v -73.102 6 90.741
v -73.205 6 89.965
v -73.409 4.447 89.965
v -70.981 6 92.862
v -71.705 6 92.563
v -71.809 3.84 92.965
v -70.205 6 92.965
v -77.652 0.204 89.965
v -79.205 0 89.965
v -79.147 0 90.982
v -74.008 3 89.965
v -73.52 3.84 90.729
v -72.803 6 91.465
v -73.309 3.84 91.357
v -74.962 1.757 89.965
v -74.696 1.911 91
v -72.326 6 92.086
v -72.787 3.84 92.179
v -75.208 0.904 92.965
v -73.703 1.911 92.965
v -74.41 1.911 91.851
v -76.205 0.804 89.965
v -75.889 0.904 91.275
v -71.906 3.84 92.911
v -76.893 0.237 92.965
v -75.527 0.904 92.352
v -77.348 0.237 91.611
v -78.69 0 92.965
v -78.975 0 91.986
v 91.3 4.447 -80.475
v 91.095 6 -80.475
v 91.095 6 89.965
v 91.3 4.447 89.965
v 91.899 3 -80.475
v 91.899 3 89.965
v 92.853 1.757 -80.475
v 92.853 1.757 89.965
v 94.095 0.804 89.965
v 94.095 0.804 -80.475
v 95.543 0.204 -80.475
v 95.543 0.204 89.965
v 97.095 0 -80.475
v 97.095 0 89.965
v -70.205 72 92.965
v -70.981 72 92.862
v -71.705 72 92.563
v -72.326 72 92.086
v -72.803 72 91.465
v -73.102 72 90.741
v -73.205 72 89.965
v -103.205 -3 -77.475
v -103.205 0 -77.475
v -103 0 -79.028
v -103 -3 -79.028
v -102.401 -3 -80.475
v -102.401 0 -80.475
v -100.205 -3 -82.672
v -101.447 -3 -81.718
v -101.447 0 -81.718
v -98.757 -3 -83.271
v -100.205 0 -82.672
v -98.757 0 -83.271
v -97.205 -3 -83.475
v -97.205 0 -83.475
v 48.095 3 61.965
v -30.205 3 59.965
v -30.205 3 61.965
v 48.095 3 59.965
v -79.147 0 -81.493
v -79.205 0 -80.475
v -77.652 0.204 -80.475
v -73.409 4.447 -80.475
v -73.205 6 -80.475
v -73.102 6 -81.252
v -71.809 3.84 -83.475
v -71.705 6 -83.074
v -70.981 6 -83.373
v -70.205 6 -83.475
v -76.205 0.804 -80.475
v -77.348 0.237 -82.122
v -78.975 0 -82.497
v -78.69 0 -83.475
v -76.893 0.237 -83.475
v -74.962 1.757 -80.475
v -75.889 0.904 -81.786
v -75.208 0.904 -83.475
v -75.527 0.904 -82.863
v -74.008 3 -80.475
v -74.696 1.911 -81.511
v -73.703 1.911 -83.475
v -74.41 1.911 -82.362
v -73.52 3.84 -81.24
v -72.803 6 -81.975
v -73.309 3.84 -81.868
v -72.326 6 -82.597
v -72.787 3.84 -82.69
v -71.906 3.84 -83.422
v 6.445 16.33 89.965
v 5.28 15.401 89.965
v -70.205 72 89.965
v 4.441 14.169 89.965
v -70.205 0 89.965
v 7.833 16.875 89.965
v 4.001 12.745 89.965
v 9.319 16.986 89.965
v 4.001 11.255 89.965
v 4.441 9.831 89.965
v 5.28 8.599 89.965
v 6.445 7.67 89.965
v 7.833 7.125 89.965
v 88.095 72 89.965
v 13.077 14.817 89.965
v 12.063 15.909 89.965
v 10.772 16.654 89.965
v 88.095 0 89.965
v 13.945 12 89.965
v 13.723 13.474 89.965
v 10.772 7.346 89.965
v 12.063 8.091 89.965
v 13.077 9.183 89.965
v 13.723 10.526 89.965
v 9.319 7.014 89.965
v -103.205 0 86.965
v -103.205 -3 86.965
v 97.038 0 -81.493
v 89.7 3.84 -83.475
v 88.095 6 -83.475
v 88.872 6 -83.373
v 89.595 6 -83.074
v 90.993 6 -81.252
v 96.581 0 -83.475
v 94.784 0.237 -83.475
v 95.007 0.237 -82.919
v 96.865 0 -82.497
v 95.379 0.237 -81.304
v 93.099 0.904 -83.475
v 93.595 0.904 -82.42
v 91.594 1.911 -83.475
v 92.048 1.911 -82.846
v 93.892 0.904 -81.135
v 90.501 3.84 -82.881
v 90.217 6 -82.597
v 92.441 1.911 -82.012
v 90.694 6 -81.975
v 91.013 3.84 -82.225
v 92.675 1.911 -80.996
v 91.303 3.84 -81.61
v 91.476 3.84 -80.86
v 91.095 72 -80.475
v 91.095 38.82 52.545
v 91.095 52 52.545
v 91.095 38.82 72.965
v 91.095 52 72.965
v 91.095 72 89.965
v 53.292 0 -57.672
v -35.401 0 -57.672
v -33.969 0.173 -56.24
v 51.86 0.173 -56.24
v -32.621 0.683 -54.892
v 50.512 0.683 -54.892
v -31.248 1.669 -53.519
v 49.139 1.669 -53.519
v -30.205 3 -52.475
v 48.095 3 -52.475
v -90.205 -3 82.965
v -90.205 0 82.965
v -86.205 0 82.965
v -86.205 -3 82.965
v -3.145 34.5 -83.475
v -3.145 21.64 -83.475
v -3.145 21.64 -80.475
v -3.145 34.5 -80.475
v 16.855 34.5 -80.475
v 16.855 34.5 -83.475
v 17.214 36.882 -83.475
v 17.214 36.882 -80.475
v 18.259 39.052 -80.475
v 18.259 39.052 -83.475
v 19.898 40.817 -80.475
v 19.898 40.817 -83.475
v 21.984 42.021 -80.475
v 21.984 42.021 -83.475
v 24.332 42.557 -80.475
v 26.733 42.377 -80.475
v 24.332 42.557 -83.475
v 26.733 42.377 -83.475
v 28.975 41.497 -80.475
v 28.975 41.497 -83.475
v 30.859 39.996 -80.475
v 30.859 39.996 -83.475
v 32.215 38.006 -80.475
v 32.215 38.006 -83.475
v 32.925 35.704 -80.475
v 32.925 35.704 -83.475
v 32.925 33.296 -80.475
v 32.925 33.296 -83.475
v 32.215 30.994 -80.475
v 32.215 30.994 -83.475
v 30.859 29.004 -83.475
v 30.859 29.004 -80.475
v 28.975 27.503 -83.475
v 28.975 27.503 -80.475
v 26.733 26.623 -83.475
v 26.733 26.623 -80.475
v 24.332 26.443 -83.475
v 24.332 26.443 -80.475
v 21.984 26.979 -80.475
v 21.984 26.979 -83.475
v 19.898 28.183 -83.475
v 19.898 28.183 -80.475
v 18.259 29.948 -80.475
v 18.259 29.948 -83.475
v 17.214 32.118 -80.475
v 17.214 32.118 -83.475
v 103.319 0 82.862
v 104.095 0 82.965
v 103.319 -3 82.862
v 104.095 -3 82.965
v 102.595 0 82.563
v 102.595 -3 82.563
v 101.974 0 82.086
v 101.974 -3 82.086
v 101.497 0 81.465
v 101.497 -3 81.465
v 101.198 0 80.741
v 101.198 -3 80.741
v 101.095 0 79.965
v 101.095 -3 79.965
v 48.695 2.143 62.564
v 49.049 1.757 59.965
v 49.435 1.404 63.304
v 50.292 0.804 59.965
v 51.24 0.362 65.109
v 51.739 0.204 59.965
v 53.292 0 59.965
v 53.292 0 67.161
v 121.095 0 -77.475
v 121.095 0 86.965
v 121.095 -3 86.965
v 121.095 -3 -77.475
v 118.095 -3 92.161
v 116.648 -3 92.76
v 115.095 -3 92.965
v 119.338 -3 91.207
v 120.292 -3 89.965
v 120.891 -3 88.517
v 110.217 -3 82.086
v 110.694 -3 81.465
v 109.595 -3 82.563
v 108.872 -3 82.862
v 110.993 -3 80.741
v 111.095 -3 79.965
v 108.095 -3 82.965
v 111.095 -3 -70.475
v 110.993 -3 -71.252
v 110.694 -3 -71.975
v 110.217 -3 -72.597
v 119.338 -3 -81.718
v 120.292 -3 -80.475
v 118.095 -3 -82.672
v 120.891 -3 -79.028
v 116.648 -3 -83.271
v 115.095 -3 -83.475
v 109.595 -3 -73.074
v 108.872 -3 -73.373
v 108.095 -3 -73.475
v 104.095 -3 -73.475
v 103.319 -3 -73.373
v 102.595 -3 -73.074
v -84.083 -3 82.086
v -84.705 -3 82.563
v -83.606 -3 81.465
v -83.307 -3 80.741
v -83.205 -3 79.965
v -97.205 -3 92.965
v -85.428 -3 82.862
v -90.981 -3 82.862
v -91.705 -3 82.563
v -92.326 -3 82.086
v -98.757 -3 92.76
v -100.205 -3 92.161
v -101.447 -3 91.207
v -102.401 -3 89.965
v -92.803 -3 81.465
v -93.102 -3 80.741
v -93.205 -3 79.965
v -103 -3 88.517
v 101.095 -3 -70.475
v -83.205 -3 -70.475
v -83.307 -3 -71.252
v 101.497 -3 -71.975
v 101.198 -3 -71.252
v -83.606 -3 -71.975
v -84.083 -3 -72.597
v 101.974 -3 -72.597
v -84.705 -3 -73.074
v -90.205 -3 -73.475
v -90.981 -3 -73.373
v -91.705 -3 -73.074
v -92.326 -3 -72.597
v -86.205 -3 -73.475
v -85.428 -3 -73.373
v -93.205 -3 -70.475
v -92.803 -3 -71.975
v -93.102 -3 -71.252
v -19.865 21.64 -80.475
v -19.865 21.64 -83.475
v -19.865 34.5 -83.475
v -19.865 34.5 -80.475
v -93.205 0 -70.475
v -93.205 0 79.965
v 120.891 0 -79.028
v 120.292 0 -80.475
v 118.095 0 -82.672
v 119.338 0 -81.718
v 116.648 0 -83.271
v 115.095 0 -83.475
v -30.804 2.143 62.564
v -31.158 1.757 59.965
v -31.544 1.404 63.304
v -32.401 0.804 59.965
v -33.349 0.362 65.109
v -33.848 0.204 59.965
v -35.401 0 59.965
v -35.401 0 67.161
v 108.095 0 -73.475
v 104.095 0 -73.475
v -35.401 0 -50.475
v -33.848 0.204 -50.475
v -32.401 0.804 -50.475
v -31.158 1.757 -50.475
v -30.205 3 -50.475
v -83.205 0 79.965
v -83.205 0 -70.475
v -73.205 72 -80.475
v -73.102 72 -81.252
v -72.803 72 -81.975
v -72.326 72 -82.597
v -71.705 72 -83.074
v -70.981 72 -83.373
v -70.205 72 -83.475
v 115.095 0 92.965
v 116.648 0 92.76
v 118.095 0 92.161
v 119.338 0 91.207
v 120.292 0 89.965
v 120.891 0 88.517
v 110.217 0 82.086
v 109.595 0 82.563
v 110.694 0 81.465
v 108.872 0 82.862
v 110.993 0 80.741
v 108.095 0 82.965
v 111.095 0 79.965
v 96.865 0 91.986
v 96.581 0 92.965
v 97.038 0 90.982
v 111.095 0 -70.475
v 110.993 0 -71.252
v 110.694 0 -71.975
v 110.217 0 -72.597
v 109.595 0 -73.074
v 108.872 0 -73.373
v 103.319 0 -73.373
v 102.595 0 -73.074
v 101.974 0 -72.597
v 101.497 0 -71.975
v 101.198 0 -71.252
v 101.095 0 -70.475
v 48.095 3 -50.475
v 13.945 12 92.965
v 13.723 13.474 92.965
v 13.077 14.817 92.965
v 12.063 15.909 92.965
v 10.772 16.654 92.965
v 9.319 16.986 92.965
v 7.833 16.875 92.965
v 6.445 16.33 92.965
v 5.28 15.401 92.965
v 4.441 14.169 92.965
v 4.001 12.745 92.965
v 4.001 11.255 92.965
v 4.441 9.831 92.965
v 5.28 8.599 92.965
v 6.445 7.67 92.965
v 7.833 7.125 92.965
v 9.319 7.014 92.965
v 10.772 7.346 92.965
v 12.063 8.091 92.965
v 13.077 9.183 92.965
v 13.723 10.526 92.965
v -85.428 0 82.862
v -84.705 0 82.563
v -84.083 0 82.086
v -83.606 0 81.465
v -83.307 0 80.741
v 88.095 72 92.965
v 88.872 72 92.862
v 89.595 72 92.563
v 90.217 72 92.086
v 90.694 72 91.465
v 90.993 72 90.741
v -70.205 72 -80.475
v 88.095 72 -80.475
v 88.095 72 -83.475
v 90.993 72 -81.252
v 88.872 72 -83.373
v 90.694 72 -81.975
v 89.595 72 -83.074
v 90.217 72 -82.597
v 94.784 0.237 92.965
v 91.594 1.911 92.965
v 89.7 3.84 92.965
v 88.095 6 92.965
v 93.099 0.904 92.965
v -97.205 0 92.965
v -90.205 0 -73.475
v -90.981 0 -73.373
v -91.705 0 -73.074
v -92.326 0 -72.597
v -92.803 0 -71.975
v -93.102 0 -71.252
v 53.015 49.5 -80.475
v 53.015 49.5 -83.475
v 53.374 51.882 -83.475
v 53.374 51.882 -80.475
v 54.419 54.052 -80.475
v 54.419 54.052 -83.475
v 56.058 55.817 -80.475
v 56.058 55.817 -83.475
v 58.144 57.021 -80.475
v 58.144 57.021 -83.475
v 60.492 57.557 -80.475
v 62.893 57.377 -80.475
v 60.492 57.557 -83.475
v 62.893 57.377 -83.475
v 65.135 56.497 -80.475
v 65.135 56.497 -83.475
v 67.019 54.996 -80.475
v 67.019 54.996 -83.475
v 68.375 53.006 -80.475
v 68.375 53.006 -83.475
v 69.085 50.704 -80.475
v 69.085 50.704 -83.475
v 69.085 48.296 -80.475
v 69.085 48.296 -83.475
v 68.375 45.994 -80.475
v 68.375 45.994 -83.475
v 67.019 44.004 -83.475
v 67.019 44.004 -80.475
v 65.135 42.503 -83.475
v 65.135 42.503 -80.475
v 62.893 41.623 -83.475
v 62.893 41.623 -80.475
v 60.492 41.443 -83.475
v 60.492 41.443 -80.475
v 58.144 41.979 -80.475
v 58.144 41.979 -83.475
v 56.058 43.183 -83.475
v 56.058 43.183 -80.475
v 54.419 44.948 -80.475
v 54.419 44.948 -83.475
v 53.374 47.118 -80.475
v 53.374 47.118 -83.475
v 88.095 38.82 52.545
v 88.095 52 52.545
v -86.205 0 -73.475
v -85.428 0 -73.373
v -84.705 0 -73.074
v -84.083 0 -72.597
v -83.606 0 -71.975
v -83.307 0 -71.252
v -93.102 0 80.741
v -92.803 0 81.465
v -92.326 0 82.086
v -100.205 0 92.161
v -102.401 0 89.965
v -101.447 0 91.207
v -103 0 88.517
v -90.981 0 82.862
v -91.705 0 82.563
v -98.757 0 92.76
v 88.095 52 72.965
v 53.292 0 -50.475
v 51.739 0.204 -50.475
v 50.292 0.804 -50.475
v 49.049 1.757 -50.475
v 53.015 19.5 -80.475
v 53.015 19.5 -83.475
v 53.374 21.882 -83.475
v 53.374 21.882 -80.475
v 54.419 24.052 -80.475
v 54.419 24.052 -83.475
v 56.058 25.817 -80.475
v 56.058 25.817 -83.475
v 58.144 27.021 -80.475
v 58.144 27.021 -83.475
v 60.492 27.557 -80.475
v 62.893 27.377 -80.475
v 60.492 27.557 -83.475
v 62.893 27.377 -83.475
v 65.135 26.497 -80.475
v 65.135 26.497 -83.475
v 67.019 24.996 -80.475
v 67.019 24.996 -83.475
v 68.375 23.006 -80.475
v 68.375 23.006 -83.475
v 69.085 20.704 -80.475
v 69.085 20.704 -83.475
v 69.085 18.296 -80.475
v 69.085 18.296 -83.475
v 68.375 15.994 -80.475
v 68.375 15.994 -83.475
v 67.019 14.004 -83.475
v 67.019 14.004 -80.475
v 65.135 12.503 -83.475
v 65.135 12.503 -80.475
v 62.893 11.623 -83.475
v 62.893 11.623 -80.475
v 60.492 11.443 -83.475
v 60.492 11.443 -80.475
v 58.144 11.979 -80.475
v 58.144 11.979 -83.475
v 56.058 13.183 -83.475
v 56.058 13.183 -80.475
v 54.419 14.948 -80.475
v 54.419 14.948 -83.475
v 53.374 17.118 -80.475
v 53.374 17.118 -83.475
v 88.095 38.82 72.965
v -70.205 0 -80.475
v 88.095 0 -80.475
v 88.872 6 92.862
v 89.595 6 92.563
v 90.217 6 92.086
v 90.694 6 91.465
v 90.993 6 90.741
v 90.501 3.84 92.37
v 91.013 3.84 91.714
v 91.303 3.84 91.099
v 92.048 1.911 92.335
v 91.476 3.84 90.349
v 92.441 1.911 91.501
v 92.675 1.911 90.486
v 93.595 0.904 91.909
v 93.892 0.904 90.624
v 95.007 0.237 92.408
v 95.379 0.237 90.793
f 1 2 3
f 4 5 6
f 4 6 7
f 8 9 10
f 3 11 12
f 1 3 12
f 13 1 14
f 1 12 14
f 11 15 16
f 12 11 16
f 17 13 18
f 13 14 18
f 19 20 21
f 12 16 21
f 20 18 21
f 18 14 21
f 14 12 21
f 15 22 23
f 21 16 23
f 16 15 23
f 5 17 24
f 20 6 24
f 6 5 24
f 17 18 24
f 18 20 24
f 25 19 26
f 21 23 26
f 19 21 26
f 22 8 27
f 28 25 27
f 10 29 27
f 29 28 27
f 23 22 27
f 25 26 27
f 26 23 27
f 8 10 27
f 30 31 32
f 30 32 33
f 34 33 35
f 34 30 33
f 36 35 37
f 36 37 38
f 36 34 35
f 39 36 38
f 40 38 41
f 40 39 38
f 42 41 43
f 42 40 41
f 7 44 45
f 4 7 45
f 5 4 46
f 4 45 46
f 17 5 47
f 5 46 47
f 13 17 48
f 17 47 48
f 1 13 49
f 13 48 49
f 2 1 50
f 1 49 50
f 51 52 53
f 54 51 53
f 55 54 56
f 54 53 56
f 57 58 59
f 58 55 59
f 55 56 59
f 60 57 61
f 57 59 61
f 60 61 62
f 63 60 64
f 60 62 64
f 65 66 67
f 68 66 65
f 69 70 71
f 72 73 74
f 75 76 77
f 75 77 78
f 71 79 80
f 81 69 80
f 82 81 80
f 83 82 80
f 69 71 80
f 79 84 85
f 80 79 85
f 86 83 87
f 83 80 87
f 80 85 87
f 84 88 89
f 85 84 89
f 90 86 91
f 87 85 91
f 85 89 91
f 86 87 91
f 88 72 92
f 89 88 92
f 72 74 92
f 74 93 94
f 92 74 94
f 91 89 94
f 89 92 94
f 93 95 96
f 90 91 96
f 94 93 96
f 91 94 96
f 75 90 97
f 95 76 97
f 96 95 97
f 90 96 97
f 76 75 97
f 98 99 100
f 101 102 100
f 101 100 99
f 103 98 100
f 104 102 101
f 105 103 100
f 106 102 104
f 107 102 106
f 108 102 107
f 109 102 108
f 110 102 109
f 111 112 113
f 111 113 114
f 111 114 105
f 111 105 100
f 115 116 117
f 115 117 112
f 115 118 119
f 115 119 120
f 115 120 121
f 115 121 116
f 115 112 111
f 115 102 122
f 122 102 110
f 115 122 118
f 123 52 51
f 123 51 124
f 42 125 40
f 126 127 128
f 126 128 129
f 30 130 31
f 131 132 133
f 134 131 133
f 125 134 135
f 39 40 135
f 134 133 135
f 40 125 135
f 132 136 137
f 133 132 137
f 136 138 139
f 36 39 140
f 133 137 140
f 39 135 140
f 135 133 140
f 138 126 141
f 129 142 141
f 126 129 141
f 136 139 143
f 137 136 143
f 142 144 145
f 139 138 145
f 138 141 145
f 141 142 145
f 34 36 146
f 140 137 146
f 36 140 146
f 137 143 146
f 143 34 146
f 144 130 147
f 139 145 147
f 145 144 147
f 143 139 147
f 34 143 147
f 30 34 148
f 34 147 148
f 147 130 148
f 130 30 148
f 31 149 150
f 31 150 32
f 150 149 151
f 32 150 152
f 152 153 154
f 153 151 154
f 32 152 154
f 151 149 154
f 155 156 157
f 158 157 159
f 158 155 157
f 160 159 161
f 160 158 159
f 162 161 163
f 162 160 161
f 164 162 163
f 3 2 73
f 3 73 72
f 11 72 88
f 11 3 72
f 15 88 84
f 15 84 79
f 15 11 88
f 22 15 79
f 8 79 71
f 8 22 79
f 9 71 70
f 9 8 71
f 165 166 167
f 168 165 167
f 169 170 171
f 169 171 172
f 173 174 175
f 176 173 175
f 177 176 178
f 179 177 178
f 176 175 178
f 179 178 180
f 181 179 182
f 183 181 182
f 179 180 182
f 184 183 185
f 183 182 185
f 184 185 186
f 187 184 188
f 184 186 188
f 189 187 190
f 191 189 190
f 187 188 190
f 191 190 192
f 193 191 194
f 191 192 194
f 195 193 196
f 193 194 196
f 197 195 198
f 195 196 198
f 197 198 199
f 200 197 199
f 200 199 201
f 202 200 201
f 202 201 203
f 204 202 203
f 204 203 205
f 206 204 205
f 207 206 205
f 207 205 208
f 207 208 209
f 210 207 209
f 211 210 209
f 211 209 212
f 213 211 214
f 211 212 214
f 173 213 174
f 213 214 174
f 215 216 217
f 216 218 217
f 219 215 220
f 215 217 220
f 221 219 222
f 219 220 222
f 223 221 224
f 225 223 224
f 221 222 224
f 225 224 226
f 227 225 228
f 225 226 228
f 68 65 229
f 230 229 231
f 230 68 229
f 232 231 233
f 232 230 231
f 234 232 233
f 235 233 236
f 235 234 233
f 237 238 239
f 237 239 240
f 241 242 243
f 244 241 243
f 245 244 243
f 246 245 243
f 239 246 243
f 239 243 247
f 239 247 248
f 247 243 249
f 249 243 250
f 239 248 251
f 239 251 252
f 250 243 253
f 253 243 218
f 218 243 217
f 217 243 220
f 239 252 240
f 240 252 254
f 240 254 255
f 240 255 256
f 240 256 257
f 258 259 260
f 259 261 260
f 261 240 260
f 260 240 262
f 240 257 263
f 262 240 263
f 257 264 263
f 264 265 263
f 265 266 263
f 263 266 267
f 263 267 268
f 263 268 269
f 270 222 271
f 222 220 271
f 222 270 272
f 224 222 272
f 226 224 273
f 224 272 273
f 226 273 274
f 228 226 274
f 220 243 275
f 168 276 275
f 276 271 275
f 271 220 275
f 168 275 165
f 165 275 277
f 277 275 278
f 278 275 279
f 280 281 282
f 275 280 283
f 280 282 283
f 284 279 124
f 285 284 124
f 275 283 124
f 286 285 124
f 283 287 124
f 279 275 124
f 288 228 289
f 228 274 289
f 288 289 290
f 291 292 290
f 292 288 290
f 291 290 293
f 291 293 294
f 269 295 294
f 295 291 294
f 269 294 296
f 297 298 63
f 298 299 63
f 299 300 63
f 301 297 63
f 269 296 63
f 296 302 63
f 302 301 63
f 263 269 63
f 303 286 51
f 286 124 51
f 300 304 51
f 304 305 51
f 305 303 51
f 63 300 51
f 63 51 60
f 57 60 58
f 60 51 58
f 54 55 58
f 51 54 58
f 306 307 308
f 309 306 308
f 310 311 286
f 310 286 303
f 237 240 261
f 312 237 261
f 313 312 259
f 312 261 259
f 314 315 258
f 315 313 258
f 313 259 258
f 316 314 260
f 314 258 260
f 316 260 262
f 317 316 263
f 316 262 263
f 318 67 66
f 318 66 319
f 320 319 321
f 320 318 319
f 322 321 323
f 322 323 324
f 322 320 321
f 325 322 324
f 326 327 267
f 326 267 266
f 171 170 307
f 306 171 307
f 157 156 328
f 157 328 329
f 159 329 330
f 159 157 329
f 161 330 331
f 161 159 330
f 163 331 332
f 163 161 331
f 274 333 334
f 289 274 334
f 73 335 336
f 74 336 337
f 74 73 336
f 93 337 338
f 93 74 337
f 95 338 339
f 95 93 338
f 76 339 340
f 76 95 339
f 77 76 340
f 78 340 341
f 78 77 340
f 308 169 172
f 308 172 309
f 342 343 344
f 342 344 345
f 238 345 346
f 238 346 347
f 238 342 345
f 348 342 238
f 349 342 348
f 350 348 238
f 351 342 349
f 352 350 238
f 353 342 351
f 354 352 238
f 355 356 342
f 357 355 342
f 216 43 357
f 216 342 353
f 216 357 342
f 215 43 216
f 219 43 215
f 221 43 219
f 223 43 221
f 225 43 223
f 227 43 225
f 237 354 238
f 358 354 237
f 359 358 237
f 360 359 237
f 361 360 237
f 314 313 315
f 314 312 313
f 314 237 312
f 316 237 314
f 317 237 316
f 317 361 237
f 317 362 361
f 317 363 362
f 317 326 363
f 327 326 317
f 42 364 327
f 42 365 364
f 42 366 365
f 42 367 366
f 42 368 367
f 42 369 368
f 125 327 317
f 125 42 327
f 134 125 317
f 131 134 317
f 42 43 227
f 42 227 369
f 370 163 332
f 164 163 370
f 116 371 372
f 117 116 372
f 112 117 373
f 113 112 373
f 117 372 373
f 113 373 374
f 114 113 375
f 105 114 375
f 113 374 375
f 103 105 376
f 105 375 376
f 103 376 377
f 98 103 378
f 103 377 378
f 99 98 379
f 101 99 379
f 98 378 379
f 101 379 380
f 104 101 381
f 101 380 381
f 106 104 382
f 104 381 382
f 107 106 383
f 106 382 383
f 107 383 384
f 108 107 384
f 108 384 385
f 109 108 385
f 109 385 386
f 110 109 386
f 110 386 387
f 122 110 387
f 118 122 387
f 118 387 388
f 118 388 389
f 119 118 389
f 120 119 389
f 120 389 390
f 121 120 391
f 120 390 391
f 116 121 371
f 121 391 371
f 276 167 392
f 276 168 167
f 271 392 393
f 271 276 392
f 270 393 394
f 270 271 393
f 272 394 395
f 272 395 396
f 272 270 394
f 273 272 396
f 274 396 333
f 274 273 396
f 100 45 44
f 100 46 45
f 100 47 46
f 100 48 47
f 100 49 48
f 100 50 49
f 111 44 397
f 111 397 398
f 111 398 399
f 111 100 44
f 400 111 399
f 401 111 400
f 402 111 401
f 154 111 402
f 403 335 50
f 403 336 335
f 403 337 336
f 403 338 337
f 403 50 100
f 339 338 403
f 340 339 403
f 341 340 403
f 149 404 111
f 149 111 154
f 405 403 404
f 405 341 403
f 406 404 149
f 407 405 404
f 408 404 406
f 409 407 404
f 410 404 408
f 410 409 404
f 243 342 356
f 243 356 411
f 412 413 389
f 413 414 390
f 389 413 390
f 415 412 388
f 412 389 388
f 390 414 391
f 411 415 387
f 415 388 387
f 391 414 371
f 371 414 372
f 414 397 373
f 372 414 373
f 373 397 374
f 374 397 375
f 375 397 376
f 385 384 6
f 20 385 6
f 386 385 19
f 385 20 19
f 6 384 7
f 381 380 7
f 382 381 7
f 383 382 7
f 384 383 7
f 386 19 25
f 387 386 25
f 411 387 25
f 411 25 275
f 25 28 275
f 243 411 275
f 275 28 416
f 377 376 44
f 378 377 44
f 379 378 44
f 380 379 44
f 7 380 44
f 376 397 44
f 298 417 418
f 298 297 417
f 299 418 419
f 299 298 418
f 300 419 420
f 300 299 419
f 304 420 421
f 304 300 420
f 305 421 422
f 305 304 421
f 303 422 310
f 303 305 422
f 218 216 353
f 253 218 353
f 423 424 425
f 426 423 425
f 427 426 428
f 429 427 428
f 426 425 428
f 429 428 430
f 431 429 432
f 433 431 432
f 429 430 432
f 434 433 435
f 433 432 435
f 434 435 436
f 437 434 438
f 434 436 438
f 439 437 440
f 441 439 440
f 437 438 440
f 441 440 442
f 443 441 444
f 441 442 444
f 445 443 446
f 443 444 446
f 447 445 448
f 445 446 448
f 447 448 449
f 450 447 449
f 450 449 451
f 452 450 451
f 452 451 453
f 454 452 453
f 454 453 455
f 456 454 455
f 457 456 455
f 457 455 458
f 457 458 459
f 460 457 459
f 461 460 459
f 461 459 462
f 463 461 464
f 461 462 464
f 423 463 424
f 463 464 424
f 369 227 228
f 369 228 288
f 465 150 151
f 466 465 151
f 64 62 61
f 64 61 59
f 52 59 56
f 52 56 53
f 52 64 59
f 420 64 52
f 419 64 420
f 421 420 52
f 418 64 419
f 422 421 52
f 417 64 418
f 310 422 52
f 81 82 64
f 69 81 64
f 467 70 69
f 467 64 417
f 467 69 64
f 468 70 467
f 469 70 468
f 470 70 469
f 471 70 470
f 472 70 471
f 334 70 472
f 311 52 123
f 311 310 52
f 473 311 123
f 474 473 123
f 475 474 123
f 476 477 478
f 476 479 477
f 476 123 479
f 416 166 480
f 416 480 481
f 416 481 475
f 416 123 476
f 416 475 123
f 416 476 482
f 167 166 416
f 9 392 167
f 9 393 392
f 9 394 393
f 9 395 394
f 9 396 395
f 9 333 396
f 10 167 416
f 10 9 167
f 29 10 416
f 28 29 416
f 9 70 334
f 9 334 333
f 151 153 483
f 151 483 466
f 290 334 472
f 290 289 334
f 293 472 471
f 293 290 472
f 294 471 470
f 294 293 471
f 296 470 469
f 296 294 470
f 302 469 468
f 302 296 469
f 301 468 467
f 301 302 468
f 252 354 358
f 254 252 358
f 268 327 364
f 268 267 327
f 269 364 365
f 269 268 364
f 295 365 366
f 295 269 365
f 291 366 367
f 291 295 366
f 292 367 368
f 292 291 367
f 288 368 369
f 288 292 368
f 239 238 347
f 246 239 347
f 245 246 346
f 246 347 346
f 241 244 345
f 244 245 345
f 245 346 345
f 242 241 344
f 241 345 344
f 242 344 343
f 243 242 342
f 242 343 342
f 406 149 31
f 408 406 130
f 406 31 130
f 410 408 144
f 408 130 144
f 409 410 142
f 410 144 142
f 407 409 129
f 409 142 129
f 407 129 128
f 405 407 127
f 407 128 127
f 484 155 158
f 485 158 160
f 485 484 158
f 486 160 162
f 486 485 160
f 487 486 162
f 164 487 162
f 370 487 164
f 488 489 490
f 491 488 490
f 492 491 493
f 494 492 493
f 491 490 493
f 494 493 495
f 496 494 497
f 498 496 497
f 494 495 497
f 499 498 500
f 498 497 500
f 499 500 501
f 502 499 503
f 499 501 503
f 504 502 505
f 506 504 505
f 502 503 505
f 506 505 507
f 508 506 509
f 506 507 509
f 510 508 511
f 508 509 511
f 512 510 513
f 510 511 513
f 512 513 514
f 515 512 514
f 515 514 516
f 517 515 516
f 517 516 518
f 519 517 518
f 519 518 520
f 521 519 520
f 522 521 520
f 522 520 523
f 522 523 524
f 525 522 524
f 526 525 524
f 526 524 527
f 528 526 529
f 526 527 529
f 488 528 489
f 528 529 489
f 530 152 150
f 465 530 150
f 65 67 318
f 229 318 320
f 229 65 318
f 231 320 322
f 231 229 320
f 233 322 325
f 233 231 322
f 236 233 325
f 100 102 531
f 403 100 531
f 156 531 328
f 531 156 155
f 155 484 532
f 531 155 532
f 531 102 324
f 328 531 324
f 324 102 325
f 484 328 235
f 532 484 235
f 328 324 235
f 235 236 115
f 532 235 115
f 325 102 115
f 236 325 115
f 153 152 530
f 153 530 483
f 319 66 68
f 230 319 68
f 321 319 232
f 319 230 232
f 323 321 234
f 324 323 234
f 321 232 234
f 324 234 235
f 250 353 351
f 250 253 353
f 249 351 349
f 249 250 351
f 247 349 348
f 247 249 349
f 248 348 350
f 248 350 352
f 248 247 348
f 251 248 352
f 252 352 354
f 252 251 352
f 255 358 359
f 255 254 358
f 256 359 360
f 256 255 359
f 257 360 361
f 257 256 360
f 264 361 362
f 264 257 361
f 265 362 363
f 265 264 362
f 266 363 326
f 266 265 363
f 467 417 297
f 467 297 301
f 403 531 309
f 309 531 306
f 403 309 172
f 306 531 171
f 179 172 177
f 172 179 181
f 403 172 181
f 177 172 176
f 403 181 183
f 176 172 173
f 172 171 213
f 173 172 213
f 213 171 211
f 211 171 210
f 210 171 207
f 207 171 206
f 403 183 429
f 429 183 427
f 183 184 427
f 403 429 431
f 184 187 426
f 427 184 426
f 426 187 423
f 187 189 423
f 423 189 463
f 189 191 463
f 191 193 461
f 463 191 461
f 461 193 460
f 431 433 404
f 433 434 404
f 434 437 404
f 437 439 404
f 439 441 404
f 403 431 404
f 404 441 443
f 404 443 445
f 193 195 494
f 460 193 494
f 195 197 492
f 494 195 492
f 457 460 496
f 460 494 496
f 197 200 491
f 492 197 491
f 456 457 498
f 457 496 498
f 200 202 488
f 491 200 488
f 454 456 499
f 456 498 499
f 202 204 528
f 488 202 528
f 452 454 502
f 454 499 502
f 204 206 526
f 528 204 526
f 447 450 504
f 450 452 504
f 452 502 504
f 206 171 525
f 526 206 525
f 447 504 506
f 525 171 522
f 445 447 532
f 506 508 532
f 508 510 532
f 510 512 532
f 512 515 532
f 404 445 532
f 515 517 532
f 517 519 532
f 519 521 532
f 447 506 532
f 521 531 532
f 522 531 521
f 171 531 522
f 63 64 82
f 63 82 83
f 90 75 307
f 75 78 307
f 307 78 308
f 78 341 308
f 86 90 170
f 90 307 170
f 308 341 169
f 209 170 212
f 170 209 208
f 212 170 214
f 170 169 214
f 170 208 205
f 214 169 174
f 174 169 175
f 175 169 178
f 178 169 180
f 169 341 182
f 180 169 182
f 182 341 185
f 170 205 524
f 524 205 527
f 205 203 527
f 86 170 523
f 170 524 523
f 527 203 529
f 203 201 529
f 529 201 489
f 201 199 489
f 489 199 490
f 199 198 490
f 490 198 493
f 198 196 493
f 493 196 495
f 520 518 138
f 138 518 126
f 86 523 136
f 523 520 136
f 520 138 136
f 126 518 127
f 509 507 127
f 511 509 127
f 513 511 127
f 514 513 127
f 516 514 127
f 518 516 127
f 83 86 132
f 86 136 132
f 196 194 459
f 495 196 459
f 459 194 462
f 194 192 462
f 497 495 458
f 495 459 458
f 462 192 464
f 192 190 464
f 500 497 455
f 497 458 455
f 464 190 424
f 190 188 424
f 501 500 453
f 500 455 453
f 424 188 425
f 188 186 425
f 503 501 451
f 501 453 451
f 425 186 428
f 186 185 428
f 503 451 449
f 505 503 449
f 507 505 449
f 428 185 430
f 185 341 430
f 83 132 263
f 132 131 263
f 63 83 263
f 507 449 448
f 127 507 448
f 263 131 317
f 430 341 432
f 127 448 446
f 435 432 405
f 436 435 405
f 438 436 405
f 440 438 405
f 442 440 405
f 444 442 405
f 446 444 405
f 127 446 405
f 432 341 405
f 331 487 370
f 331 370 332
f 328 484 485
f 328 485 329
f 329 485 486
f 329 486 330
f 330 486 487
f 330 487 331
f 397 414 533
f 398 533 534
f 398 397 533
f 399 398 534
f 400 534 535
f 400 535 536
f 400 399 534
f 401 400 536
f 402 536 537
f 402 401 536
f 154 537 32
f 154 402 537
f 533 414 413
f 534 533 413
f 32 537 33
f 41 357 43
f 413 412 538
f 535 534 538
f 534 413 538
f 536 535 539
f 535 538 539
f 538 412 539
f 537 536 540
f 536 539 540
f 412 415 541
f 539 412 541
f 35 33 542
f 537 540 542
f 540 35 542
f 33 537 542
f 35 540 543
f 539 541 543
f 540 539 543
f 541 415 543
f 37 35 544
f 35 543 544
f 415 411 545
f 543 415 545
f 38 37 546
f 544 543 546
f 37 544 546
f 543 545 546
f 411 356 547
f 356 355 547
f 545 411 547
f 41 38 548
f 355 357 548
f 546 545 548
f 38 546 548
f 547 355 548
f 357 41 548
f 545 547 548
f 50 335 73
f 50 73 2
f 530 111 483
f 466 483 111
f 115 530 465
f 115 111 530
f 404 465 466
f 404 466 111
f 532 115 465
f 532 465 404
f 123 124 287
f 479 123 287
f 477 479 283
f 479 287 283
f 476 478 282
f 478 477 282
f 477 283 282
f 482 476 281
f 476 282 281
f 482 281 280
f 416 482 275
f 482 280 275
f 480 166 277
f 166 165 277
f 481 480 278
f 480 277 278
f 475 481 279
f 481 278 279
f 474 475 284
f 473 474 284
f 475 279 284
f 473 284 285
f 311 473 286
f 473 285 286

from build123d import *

# Parameters (mm, degrees)
SKETCH1_W           = 164.3
SKETCH1_H           = 176.44
SKETCH1_W_2         = 158.3
SKETCH1_H_2         = 170.44
BOSS_EXTRUDE1_DEPTH = 72
SKETCH2_W           = 164.3
SKETCH2_H           = 176.44
BOSS_EXTRUDE2_DEPTH = 3
SKETCH3_R           = 8.08
SKETCH3_W           = 16.72
SKETCH3_H           = 12.86
CUT_EXTRUDE1_DEPTH  = 3
SKETCH4_W           = 20.42
SKETCH4_H           = 13.18
CUT_EXTRUDE2_DEPTH  = 3
SKETCH5_R           = 5
CUT_EXTRUDE3_DEPTH  = 3
SKETCH6_W           = 176.44
SKETCH6_H           = 3
BOSS_EXTRUDE3_DEPTH = 30
SKETCH7_W           = 176.44
SKETCH7_H           = 3
BOSS_EXTRUDE4_DEPTH = 30
SKETCH9_W           = 10
SKETCH9_H           = 156.44
CUT_EXTRUDE4_DEPTH  = 169.791343641
SKETCH10_W          = 10
SKETCH10_H          = 156.44
CUT_EXTRUDE5_DEPTH  = 169.791343641
FILLET1_R           = 3
FILLET2_R           = 6
SKETCH11_W          = 78.3
SKETCH11_H          = 2
BOSS_EXTRUDE5_DEPTH = 3
FILLET3_R           = 6


with BuildPart() as part:
    # Sketch1 → Boss-Extrude1 (new body)
    with BuildSketch(Plane(origin=(0, 0, 0), x_dir=(1, 0, 0), z_dir=(0, 1, 0))):
        with Locations((8.94546986, -4.744535538)):
            Rectangle(SKETCH1_W, SKETCH1_H)
        with Locations((8.94546986, -4.744535538)):
            Rectangle(SKETCH1_W_2, SKETCH1_H_2, mode=Mode.SUBTRACT)
    extrude(amount=BOSS_EXTRUDE1_DEPTH)

    # Sketch2 → Boss-Extrude2 (add)
    with BuildSketch(Plane.XZ):
        with Locations((8.94546986, 4.744535538)):
            Rectangle(SKETCH2_W, SKETCH2_H)
    extrude(amount=BOSS_EXTRUDE2_DEPTH)

    # Sketch3 → Cut-Extrude1 (cut)
    with BuildSketch(Plane(origin=(0, 0, -83.475464462), x_dir=(-1, 0, 0), z_dir=(0, 0, -1))):
        with Locations((-61.09546986, 49.5)):
            Circle(SKETCH3_R)
        with Locations((-61.09546986, 19.5)):
            Circle(SKETCH3_R)
        with Locations((-24.93546986, 34.5)):
            Circle(SKETCH3_R)
        with Locations((11.50453014, 28.07)):
            Rectangle(SKETCH3_W, SKETCH3_H)
    extrude(amount=-CUT_EXTRUDE1_DEPTH, mode=Mode.SUBTRACT)

    # Sketch4 → Cut-Extrude2 (cut)
    with BuildSketch(Plane(origin=(91.09546986, 0, 0), x_dir=(0, 0, -1), z_dir=(1, 0, 0))):
        with Locations((-62.754535538, 45.41)):
            Rectangle(SKETCH4_W, SKETCH4_H)
    extrude(amount=-CUT_EXTRUDE2_DEPTH, mode=Mode.SUBTRACT)

    # Sketch5 → Cut-Extrude3 (cut)
    with BuildSketch(Plane.XY.offset(92.964535538)):
        with Locations((8.94546986, 12)):
            Circle(SKETCH5_R)
    extrude(amount=-CUT_EXTRUDE3_DEPTH, mode=Mode.SUBTRACT)

    # Sketch6 → Boss-Extrude3 (add)
    with BuildSketch(Plane.ZY.offset(73.20453014)):
        with Locations((4.744535538, -1.5)):
            Rectangle(SKETCH6_W, SKETCH6_H)
    extrude(amount=BOSS_EXTRUDE3_DEPTH)

    # Sketch7 → Boss-Extrude4 (add)
    with BuildSketch(Plane(origin=(91.09546986, 0, 0), x_dir=(0, 0, -1), z_dir=(1, 0, 0))):
        with Locations((-4.744535538, -1.5)):
            Rectangle(SKETCH7_W, SKETCH7_H)
    extrude(amount=BOSS_EXTRUDE4_DEPTH)

    # Sketch9 → Cut-Extrude4 (cut, through all)
    with BuildSketch(Plane(origin=(0, 0, 0), x_dir=(1, 0, 0), z_dir=(0, 1, 0))):
        with Locations((-88.20453014, -4.744535538)):
            Rectangle(SKETCH9_W, SKETCH9_H)
    extrude(amount=-CUT_EXTRUDE4_DEPTH, mode=Mode.SUBTRACT)

    # Sketch10 → Cut-Extrude5 (cut, through all)
    with BuildSketch(Plane(origin=(0, 0, 0), x_dir=(1, 0, 0), z_dir=(0, 1, 0))):
        with Locations((106.09546986, -4.744535538)):
            Rectangle(SKETCH10_W, SKETCH10_H)
    extrude(amount=-CUT_EXTRUDE5_DEPTH, mode=Mode.SUBTRACT)

    # Fillet1
    fillet1_edges = [part.edges().sort_by_distance(p)[0] for p in [
        (-83.20453014, -1.5, 82.964535538),
        (-93.20453014, -1.5, 82.964535538),
        (-93.20453014, -1.5, -73.475464462),
        (-83.20453014, -1.5, -73.475464462),
        (101.09546986, -1.5, -73.475464462),
        (111.09546986, -1.5, -73.475464462),
        (111.09546986, -1.5, 82.964535538),
        (101.09546986, -1.5, 82.964535538),
        (91.09546986, 36, -83.475464462),
        (91.09546986, 36, 92.964535538),
        (-73.20453014, 36, 92.964535538),
        (-73.20453014, 36, -83.475464462),
    ]]
    fillet(fillet1_edges, radius=FILLET1_R)

    # Fillet2
    # the kernel refuses this fillet: 6 mm, written as the material it adds along each edge
    with BuildSketch(Plane(origin=(-73.20453014, 0, 89.964535538), x_dir=(0, 1, 0), z_dir=(0, 0, -1)), Plane(origin=(91.09546986, 0, -80.475464462), x_dir=(0, 1, 0), z_dir=(0, 0, 1))) as fillet2_piece_1:
        with BuildLine():
            CenterArc((FILLET2_R, -FILLET2_R), FILLET2_R, 90, 90)
            Line((0, -FILLET2_R), (0, 0))
            Line((0, 0), (FILLET2_R, 0))
        make_face()
    extrude(amount=170.44)
    with BuildSketch(Plane(origin=(-70.20453014, 0, 89.964535538), x_dir=(-1, 0, 0), z_dir=(0, 0, -1))) as fillet2_piece_2_section:
        with BuildLine():
            CenterArc((3 + FILLET2_R, FILLET2_R), FILLET2_R, 180, 90)
            Line((3 + FILLET2_R, 0), (3, 0))
            Line((3, 0), (3, FILLET2_R))
        make_face()
    fillet2_piece_2 = revolve(axis=Axis((-70.20453014, 0, 89.964535538), (0, 1, 0)), revolution_arc=90, mode=Mode.PRIVATE)
    fillet2_piece_2 = split(fillet2_piece_2, bisect_by=Plane(origin=(-72.485257405, 2.132983428, 92.964535538), z_dir=(0, 0, -1)), keep=Keep.TOP, mode=Mode.PRIVATE)
    add(fillet2_piece_2)
    with BuildSketch(Plane(origin=(88.09546986, 0, 89.964535538), x_dir=(0, 0, 1), z_dir=(-1, 0, 0))) as fillet2_piece_3_section:
        with BuildLine():
            CenterArc((3 + FILLET2_R, FILLET2_R), FILLET2_R, 180, 90)
            Line((3, FILLET2_R), (3, 0))
            Line((3, 0), (3 + FILLET2_R, 0))
        make_face()
    fillet2_piece_3 = revolve(axis=Axis((88.09546986, 0, 89.964535538), (0, 1, 0)), revolution_arc=90, mode=Mode.PRIVATE)
    fillet2_piece_3 = split(fillet2_piece_3, bisect_by=Plane(origin=(90.376197118, 2.132983428, 92.964535538), z_dir=(0, 0, -1)), keep=Keep.TOP, mode=Mode.PRIVATE)
    add(fillet2_piece_3)
    with BuildSketch(Plane(origin=(88.09546986, 0, -80.475464462), x_dir=(0, 0, -1), z_dir=(-1, 0, 0))) as fillet2_piece_4_section:
        with BuildLine():
            CenterArc((3 + FILLET2_R, -FILLET2_R), FILLET2_R, 90, 90)
            Line((3, -FILLET2_R), (3, 0))
            Line((3, 0), (3 + FILLET2_R, 0))
        make_face()
    fillet2_piece_4 = revolve(axis=Axis((88.09546986, 0, -80.475464462), (0, -1, 0)), revolution_arc=90, mode=Mode.PRIVATE)
    fillet2_piece_4 = split(fillet2_piece_4, bisect_by=Plane(origin=(90.376233662, 2.13290724, -83.475464462), z_dir=(0, 0, 1)), keep=Keep.TOP, mode=Mode.PRIVATE)
    add(fillet2_piece_4)
    with BuildSketch(Plane(origin=(-70.20453014, 0, -80.475464462), x_dir=(-1, 0, 0), z_dir=(0, 0, 1))) as fillet2_piece_5_section:
        with BuildLine():
            CenterArc((3 + FILLET2_R, -FILLET2_R), FILLET2_R, 90, 90)
            Line((3 + FILLET2_R, 0), (3, 0))
            Line((3, 0), (3, -FILLET2_R))
        make_face()
    fillet2_piece_5 = revolve(axis=Axis((-70.20453014, 0, -80.475464462), (0, -1, 0)), revolution_arc=90, mode=Mode.PRIVATE)
    fillet2_piece_5 = split(fillet2_piece_5, bisect_by=Plane(origin=(-72.485257393, 2.132983423, -83.475464462), z_dir=(0, 0, 1)), keep=Keep.TOP, mode=Mode.PRIVATE)
    add(fillet2_piece_5)
    # the kernel refuses this fillet: 6 mm, written as the material it takes off along each edge
    with BuildSketch(Plane(origin=(121.09546986, 15, 92.964535538), x_dir=(-1, 0, 0), z_dir=(0, -1, 0)), Plane(origin=(121.09546986, -18, -83.475464462), x_dir=(-1, 0, 0), z_dir=(0, 1, 0)), Plane(origin=(-103.20453014, 15, -83.475464462), x_dir=(1, 0, 0), z_dir=(0, -1, 0)), Plane(origin=(-103.20453014, -18, 92.964535538), x_dir=(1, 0, 0), z_dir=(0, 1, 0))) as fillet2_2_piece_1:
        with BuildLine():
            CenterArc((FILLET2_R, FILLET2_R), FILLET2_R, 180, 90)
            Line((0, FILLET2_R), (0, 0))
            Line((0, 0), (FILLET2_R, 0))
        make_face()
    extrude(amount=33, mode=Mode.SUBTRACT)

    # Sketch11 → Boss-Extrude5 (add)
    with BuildSketch(Plane(origin=(0, 0, 0), x_dir=(1, 0, 0), z_dir=(0, 1, 0))):
        with Locations((8.94546986, 51.475464462)):
            Rectangle(SKETCH11_W, SKETCH11_H)
        with Locations((8.94546986, -60.964535538)):
            Rectangle(SKETCH11_W, SKETCH11_H)
    extrude(amount=BOSS_EXTRUDE5_DEPTH)

    # Fillet3
    # the kernel refuses this fillet: 6 mm, written as the material it adds along each edge
    with BuildSketch(Plane(origin=(48.09546986, 0, 61.964535538), x_dir=(0, 0, 1), z_dir=(-1, 0, 0))) as fillet3_piece_1:
        with BuildLine():
            CenterArc((5.196152423, 6), FILLET3_R, 210, 60)
            Line((0, 3), (-0.103923048, 2.94))
            ThreePointArc((-0.103923048, 2.94), (-0.12, 1.5), (-0.12, 0))
            Line((-0.12, 0), (0, -0.12))
            Line((0, -0.12), (5.196152423, -0.12))
            Line((5.196152423, -0.12), (5.196152423, 0))
        make_face()
    extrude(amount=78.3)
    with BuildSketch(Plane(origin=(48.09546986, 0, -52.475464462), x_dir=(0, 0, -1), z_dir=(-1, 0, 0))) as fillet3_piece_2:
        with BuildLine():
            CenterArc((5.196152423, -6), FILLET3_R, 90, 60)
            Line((0, -3), (-0.103923048, -2.94))
            ThreePointArc((-0.103923048, -2.94), (-0.12, -1.5), (-0.12, 0))
            Line((-0.12, 0), (0, 0.12))
            Line((0, 0.12), (5.196152423, 0.12))
            Line((5.196152423, 0.12), (5.196152423, 0))
        make_face()
    extrude(amount=78.3)
    with BuildSketch(Plane(origin=(-30.20453014, 0, 61.964535538), x_dir=(-1, 0, 0), z_dir=(0, 0, -1)), Plane(origin=(48.09546986, 0, 59.964535538), x_dir=(1, 0, 0), z_dir=(0, 0, 1))) as fillet3_piece_3:
        with BuildLine():
            CenterArc((5.196152423, 6), FILLET3_R, 210, 60)
            Line((0, 3), (-0.103923048, 2.94))
            ThreePointArc((-0.103923048, 2.94), (-0.12, 1.5), (-0.12, 0))
            Line((-0.12, 0), (0, -0.12))
            Line((0, -0.12), (5.196152423, -0.12))
            Line((5.196152423, -0.12), (5.196152423, 0))
        make_face()
    extrude(amount=2)
    with BuildSketch(Plane(origin=(48.09546986, 0, -50.475464462), x_dir=(1, 0, 0), z_dir=(0, 0, -1)), Plane(origin=(-30.20453014, 0, -52.475464462), x_dir=(-1, 0, 0), z_dir=(0, 0, 1))) as fillet3_piece_4:
        with BuildLine():
            CenterArc((5.196152423, -6), FILLET3_R, 90, 60)
            Line((0, -3), (-0.103923048, -2.94))
            ThreePointArc((-0.103923048, -2.94), (-0.12, -1.5), (-0.12, 0))
            Line((-0.12, 0), (0, 0.12))
            Line((0, 0.12), (5.196152423, 0.12))
            Line((5.196152423, 0.12), (5.196152423, 0))
        make_face()
    extrude(amount=2)
    with BuildSketch(Plane(origin=(48.09546986, 0, 59.964535538), x_dir=(1, 0, 0), z_dir=(0, 0, 1))) as fillet3_piece_5a_section:
        with BuildLine():
            CenterArc((5.196152423, 6), FILLET3_R, 210, 60)
            Line((0, 3), (-0.103923048, 2.94))
            ThreePointArc((-0.103923048, 2.94), (-0.12, 1.5), (-0.12, 0))
            Line((-0.12, 0), (0, -0.12))
            Line((0, -0.12), (5.196152423, -0.12))
            Line((5.196152423, -0.12), (5.196152423, 0))
        make_face()
    fillet3_piece_5a = extrude(amount=14.990381057, mode=Mode.PRIVATE)
    fillet3_piece_5a = split(fillet3_piece_5a, bisect_by=Plane(origin=(49.393332535, 0.777100266, 61.964535538), z_dir=(0, 0, 1)), keep=Keep.TOP, mode=Mode.PRIVATE)
    with BuildSketch(Plane(origin=(61.085850916, 0, 61.964535538), x_dir=(0, 0, 1), z_dir=(-1, 0, 0))) as fillet3_piece_5b_section:
        with BuildLine():
            CenterArc((5.196152423, 6), FILLET3_R, 210, 60)
            Line((0, 3), (-0.103923048, 2.94))
            ThreePointArc((-0.103923048, 2.94), (-0.12, 1.5), (-0.12, 0))
            Line((-0.12, 0), (0, -0.12))
            Line((0, -0.12), (5.196152423, -0.12))
            Line((5.196152423, -0.12), (5.196152423, 0))
        make_face()
    fillet3_piece_5b = extrude(amount=91.290381057, mode=Mode.PRIVATE)
    fillet3_piece_5b = split(fillet3_piece_5b, bisect_by=Plane(origin=(48.09546986, 0.777100266, 63.262398213), z_dir=(1, 0, 0)), keep=Keep.TOP, mode=Mode.PRIVATE)
    fillet3_piece_5 = fillet3_piece_5a & fillet3_piece_5b
    add(fillet3_piece_5)
    with BuildSketch(Plane(origin=(48.09546986, 0, 61.964535538), x_dir=(0, 0, 1), z_dir=(-1, 0, 0))) as fillet3_piece_6a_section:
        with BuildLine():
            CenterArc((5.196152423, 6), FILLET3_R, 210, 60)
            Line((0, 3), (-0.103923048, 2.94))
            ThreePointArc((-0.103923048, 2.94), (-0.12, 1.5), (-0.12, 0))
            Line((-0.12, 0), (0, -0.12))
            Line((0, -0.12), (5.196152423, -0.12))
            Line((5.196152423, -0.12), (5.196152423, 0))
        make_face()
    fillet3_piece_6a = extrude(amount=91.290381057, mode=Mode.PRIVATE)
    fillet3_piece_6a = split(fillet3_piece_6a, bisect_by=Plane(origin=(-30.20453014, 0.777100266, 63.262398213), z_dir=(-1, 0, 0)), keep=Keep.TOP, mode=Mode.PRIVATE)
    with BuildSketch(Plane(origin=(-30.20453014, 0, 74.954916594), x_dir=(-1, 0, 0), z_dir=(0, 0, -1))) as fillet3_piece_6b_section:
        with BuildLine():
            CenterArc((5.196152423, 6), FILLET3_R, 210, 60)
            Line((0, 3), (-0.103923048, 2.94))
            ThreePointArc((-0.103923048, 2.94), (-0.12, 1.5), (-0.12, 0))
            Line((-0.12, 0), (0, -0.12))
            Line((0, -0.12), (5.196152423, -0.12))
            Line((5.196152423, -0.12), (5.196152423, 0))
        make_face()
    fillet3_piece_6b = extrude(amount=14.990381057, mode=Mode.PRIVATE)
    fillet3_piece_6b = split(fillet3_piece_6b, bisect_by=Plane(origin=(-31.502392815, 0.777100266, 61.964535538), z_dir=(0, 0, 1)), keep=Keep.TOP, mode=Mode.PRIVATE)
    fillet3_piece_6 = fillet3_piece_6a & fillet3_piece_6b
    add(fillet3_piece_6)
    with BuildSketch(Plane(origin=(61.085850916, 0, -52.475464462), x_dir=(0, 0, -1), z_dir=(-1, 0, 0))) as fillet3_piece_7a_section:
        with BuildLine():
            CenterArc((5.196152423, -6), FILLET3_R, 90, 60)
            Line((0, -3), (-0.103923048, -2.94))
            ThreePointArc((-0.103923048, -2.94), (-0.12, -1.5), (-0.12, 0))
            Line((-0.12, 0), (0, 0.12))
            Line((0, 0.12), (5.196152423, 0.12))
            Line((5.196152423, 0.12), (5.196152423, 0))
        make_face()
    fillet3_piece_7a = extrude(amount=91.290381057, mode=Mode.PRIVATE)
    fillet3_piece_7a = split(fillet3_piece_7a, bisect_by=Plane(origin=(48.09546986, 0.777100266, -53.773327137), z_dir=(1, 0, 0)), keep=Keep.TOP, mode=Mode.PRIVATE)
    with BuildSketch(Plane(origin=(48.09546986, 0, -50.475464462), x_dir=(1, 0, 0), z_dir=(0, 0, -1))) as fillet3_piece_7b_section:
        with BuildLine():
            CenterArc((5.196152423, -6), FILLET3_R, 90, 60)
            Line((0, -3), (-0.103923048, -2.94))
            ThreePointArc((-0.103923048, -2.94), (-0.12, -1.5), (-0.12, 0))
            Line((-0.12, 0), (0, 0.12))
            Line((0, 0.12), (5.196152423, 0.12))
            Line((5.196152423, 0.12), (5.196152423, 0))
        make_face()
    fillet3_piece_7b = extrude(amount=14.990381057, mode=Mode.PRIVATE)
    fillet3_piece_7b = split(fillet3_piece_7b, bisect_by=Plane(origin=(49.393332535, 0.777100266, -52.475464462), z_dir=(0, 0, -1)), keep=Keep.TOP, mode=Mode.PRIVATE)
    fillet3_piece_7 = fillet3_piece_7a & fillet3_piece_7b
    add(fillet3_piece_7)
    with BuildSketch(Plane(origin=(-30.20453014, 0, -65.465845519), x_dir=(-1, 0, 0), z_dir=(0, 0, 1))) as fillet3_piece_8a_section:
        with BuildLine():
            CenterArc((5.196152423, -6), FILLET3_R, 90, 60)
            Line((0, -3), (-0.103923048, -2.94))
            ThreePointArc((-0.103923048, -2.94), (-0.12, -1.5), (-0.12, 0))
            Line((-0.12, 0), (0, 0.12))
            Line((0, 0.12), (5.196152423, 0.12))
            Line((5.196152423, 0.12), (5.196152423, 0))
        make_face()
    fillet3_piece_8a = extrude(amount=14.990381057, mode=Mode.PRIVATE)
    fillet3_piece_8a = split(fillet3_piece_8a, bisect_by=Plane(origin=(-31.502392815, 0.777100266, -52.475464462), z_dir=(0, 0, -1)), keep=Keep.TOP, mode=Mode.PRIVATE)
    with BuildSketch(Plane(origin=(48.09546986, 0, -52.475464462), x_dir=(0, 0, -1), z_dir=(-1, 0, 0))) as fillet3_piece_8b_section:
        with BuildLine():
            CenterArc((5.196152423, -6), FILLET3_R, 90, 60)
            Line((0, -3), (-0.103923048, -2.94))
            ThreePointArc((-0.103923048, -2.94), (-0.12, -1.5), (-0.12, 0))
            Line((-0.12, 0), (0, 0.12))
            Line((0, 0.12), (5.196152423, 0.12))
            Line((5.196152423, 0.12), (5.196152423, 0))
        make_face()
    fillet3_piece_8b = extrude(amount=91.290381057, mode=Mode.PRIVATE)
    fillet3_piece_8b = split(fillet3_piece_8b, bisect_by=Plane(origin=(-30.20453014, 0.777100266, -53.773327137), z_dir=(-1, 0, 0)), keep=Keep.TOP, mode=Mode.PRIVATE)
    fillet3_piece_8 = fillet3_piece_8a & fillet3_piece_8b
    add(fillet3_piece_8)


solid = part.part
